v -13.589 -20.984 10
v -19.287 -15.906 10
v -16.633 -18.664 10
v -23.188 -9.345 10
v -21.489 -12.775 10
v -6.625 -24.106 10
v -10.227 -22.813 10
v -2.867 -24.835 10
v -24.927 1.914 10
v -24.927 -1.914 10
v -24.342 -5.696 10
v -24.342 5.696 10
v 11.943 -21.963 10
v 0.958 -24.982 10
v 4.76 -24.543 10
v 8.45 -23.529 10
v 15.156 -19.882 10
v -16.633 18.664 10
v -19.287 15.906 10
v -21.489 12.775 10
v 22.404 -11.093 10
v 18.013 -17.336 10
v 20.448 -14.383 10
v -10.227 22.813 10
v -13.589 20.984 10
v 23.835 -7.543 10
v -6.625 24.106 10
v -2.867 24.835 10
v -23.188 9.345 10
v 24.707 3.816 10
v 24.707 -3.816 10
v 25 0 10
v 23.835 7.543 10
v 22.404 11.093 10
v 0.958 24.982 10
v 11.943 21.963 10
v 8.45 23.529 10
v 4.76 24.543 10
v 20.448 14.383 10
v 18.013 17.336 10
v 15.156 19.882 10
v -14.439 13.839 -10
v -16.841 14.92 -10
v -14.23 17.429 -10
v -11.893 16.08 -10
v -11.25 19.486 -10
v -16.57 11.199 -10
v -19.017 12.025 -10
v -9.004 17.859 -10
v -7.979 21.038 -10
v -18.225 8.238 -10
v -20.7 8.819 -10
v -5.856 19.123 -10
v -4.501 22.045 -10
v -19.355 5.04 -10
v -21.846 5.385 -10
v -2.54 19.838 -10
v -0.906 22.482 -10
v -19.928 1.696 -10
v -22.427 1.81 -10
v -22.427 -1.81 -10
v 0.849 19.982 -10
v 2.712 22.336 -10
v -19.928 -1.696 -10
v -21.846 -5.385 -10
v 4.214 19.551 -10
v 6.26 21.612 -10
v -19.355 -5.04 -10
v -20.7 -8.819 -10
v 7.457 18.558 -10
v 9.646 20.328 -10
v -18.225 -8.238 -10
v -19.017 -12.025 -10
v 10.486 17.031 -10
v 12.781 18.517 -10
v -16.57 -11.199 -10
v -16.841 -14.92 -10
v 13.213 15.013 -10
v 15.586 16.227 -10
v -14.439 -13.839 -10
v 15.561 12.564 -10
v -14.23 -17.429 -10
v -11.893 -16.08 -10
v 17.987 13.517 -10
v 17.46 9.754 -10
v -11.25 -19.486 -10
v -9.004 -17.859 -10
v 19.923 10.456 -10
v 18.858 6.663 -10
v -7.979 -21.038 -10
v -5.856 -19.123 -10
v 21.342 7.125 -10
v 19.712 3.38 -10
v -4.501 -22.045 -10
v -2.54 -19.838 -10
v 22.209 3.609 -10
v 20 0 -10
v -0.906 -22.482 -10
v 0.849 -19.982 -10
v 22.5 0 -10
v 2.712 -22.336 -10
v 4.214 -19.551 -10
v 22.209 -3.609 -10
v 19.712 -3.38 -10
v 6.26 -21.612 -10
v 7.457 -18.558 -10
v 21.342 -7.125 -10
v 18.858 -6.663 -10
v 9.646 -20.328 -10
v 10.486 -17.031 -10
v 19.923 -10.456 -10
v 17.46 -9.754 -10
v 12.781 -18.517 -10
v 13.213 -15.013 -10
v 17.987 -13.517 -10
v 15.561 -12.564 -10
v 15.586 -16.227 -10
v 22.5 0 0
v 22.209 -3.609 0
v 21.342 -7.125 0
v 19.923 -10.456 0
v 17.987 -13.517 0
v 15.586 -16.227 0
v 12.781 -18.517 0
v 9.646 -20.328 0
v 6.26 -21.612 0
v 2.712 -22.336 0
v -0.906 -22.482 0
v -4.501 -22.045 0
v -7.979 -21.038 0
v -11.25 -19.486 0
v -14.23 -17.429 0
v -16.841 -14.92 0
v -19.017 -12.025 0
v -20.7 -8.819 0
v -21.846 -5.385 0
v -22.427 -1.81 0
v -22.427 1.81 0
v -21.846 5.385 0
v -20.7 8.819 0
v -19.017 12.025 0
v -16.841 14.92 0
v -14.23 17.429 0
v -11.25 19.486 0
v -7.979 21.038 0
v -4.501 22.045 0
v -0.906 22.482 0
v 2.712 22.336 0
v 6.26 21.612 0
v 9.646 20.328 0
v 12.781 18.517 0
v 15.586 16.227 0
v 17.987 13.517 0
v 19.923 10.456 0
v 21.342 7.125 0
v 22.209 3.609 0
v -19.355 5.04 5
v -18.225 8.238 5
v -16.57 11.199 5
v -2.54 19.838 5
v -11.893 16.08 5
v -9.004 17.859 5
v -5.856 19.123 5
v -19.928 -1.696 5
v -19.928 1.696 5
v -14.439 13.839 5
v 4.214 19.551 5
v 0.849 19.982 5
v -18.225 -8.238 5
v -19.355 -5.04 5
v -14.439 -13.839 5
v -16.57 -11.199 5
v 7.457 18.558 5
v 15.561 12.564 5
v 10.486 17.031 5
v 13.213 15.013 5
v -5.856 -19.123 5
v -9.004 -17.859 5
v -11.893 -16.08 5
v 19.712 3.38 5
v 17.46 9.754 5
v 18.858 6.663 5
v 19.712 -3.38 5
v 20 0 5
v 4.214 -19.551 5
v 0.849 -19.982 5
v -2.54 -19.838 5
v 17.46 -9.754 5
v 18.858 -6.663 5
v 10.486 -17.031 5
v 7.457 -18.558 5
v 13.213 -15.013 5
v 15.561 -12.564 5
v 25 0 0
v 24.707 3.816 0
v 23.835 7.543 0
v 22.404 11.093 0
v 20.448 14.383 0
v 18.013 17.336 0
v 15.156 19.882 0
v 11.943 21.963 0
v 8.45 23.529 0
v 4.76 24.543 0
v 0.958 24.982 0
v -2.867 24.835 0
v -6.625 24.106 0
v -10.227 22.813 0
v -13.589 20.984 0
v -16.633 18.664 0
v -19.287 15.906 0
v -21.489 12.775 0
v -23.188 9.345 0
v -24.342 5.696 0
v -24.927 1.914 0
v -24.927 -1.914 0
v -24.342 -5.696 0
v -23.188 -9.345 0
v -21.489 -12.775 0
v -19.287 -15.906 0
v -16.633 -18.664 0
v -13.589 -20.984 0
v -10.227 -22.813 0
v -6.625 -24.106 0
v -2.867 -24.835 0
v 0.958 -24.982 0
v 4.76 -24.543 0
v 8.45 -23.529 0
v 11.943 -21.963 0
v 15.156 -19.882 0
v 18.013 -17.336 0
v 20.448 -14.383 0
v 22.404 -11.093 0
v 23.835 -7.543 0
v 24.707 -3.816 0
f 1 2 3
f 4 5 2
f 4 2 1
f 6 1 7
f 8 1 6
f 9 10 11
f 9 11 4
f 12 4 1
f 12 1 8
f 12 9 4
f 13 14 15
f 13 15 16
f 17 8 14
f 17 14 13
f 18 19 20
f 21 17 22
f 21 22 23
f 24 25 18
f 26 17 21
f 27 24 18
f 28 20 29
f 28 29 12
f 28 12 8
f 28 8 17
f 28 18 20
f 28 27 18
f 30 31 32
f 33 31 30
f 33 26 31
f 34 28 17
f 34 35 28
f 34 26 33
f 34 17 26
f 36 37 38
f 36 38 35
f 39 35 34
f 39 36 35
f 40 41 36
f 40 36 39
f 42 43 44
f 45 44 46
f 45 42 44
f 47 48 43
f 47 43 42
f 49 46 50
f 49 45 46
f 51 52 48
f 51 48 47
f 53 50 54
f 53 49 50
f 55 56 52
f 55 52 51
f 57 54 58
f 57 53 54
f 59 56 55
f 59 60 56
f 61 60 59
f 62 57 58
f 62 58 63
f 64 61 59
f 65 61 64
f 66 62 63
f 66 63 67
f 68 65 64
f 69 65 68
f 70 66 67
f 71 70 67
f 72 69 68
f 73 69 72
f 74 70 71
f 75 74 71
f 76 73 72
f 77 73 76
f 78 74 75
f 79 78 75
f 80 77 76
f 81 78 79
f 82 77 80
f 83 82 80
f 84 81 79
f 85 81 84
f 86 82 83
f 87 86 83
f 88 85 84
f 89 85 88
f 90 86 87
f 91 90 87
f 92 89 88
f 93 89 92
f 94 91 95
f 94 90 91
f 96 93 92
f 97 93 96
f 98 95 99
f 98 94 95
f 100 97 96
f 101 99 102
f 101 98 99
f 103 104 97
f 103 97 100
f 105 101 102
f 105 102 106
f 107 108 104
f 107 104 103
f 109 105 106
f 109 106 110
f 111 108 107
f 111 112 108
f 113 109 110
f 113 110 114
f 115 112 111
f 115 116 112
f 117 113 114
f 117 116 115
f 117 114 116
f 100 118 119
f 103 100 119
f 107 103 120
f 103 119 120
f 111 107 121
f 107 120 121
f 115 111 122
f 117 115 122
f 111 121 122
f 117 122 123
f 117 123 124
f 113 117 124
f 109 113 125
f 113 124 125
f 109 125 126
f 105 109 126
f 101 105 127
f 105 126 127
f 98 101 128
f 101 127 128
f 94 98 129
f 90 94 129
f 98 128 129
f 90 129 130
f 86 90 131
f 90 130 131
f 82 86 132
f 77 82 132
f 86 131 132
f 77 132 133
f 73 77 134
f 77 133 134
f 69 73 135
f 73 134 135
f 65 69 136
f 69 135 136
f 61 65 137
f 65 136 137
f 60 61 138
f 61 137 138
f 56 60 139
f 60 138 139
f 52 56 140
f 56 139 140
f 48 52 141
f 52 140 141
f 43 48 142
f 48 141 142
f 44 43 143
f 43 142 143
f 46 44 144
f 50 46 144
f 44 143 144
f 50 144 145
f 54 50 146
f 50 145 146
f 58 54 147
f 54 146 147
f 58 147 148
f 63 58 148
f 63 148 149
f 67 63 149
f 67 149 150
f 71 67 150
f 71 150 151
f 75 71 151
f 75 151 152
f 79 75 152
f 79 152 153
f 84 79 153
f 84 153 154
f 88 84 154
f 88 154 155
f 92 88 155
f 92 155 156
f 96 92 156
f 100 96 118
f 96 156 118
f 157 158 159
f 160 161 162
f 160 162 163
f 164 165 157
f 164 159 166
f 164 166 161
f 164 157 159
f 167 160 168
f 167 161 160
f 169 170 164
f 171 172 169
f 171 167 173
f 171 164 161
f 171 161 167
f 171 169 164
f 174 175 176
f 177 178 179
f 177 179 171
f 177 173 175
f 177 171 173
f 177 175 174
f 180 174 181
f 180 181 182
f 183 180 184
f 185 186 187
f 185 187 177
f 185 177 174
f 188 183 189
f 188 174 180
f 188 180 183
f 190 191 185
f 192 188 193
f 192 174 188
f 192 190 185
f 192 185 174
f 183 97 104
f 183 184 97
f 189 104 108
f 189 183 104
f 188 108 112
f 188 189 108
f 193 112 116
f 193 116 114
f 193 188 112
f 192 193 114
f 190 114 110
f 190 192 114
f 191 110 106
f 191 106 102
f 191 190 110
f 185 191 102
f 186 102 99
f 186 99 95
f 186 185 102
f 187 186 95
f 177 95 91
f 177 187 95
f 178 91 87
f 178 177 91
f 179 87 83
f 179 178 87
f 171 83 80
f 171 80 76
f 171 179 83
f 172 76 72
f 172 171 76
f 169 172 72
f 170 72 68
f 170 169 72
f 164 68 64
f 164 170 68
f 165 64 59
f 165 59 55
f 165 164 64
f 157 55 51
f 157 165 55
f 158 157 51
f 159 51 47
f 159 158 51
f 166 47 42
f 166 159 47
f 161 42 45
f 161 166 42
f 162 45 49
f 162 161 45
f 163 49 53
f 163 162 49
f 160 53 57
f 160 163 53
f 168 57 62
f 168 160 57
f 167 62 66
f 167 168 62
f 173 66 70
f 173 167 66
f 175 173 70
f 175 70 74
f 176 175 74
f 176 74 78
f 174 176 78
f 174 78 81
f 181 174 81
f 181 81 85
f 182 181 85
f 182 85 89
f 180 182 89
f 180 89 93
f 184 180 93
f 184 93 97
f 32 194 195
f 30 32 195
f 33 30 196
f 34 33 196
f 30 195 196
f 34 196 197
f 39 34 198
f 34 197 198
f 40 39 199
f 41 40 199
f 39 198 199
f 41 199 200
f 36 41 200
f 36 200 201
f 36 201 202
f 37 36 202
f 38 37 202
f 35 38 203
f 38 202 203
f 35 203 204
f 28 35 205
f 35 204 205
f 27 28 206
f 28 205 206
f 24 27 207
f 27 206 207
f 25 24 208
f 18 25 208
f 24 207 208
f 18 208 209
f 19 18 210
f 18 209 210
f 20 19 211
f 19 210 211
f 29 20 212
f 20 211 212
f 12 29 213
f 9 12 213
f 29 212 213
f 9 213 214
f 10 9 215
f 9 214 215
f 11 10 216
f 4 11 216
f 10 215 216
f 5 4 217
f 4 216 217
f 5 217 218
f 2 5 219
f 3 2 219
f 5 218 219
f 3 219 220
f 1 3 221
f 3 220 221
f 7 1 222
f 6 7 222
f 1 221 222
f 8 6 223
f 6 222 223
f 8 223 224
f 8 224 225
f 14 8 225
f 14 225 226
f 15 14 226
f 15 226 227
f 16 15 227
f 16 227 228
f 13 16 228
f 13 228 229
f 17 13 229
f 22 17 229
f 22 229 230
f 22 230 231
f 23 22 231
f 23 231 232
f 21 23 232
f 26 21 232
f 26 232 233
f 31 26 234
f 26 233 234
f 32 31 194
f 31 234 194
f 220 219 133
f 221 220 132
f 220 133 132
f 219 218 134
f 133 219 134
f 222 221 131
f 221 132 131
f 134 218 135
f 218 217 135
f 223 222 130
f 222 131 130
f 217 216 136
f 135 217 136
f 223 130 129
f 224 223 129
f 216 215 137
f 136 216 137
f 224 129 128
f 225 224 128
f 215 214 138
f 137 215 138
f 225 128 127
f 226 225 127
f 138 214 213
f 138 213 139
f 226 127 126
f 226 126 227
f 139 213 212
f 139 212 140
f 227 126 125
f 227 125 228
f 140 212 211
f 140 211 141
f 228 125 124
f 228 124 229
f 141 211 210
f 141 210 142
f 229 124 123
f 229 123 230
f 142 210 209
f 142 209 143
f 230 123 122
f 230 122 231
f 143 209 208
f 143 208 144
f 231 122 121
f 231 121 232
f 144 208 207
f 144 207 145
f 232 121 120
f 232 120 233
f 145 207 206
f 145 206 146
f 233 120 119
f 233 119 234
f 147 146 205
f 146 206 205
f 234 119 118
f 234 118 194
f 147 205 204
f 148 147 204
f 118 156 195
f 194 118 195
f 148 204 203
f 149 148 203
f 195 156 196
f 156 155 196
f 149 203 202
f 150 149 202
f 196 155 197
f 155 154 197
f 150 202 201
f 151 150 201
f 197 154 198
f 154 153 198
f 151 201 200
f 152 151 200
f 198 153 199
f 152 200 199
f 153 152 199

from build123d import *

# Parameters (mm, degrees)
SKETCH_R      = 25
PAD_DEPTH     = 10
SKETCH001_R   = 22.5
SKETCH001_R_2 = 20
PAD001_DEPTH  = 10
SKETCH002_R   = 20
POCKET_DEPTH  = 5


with BuildPart() as part:
    # Sketch → Pad (new body)
    with BuildSketch(Plane.XY):
        Circle(SKETCH_R)
    extrude(amount=PAD_DEPTH)

    # Sketch001 (on Face2 of Pad) → Pad001 (join)
    with BuildSketch(Plane(origin=(0, 0, 0), x_dir=(1, 0, 0), z_dir=(0, 0, -1))):
        Circle(SKETCH001_R)
        Circle(SKETCH001_R_2, mode=Mode.SUBTRACT)
    extrude(amount=PAD001_DEPTH)

    # Sketch002 (on Face7 of Pad001) → Pocket (cut)
    with BuildSketch(Plane(origin=(0, 0, 0), x_dir=(1, 0, 0), z_dir=(0, 0, -1))):
        Circle(SKETCH002_R)
    extrude(amount=-POCKET_DEPTH, mode=Mode.SUBTRACT)


solid = part.part
